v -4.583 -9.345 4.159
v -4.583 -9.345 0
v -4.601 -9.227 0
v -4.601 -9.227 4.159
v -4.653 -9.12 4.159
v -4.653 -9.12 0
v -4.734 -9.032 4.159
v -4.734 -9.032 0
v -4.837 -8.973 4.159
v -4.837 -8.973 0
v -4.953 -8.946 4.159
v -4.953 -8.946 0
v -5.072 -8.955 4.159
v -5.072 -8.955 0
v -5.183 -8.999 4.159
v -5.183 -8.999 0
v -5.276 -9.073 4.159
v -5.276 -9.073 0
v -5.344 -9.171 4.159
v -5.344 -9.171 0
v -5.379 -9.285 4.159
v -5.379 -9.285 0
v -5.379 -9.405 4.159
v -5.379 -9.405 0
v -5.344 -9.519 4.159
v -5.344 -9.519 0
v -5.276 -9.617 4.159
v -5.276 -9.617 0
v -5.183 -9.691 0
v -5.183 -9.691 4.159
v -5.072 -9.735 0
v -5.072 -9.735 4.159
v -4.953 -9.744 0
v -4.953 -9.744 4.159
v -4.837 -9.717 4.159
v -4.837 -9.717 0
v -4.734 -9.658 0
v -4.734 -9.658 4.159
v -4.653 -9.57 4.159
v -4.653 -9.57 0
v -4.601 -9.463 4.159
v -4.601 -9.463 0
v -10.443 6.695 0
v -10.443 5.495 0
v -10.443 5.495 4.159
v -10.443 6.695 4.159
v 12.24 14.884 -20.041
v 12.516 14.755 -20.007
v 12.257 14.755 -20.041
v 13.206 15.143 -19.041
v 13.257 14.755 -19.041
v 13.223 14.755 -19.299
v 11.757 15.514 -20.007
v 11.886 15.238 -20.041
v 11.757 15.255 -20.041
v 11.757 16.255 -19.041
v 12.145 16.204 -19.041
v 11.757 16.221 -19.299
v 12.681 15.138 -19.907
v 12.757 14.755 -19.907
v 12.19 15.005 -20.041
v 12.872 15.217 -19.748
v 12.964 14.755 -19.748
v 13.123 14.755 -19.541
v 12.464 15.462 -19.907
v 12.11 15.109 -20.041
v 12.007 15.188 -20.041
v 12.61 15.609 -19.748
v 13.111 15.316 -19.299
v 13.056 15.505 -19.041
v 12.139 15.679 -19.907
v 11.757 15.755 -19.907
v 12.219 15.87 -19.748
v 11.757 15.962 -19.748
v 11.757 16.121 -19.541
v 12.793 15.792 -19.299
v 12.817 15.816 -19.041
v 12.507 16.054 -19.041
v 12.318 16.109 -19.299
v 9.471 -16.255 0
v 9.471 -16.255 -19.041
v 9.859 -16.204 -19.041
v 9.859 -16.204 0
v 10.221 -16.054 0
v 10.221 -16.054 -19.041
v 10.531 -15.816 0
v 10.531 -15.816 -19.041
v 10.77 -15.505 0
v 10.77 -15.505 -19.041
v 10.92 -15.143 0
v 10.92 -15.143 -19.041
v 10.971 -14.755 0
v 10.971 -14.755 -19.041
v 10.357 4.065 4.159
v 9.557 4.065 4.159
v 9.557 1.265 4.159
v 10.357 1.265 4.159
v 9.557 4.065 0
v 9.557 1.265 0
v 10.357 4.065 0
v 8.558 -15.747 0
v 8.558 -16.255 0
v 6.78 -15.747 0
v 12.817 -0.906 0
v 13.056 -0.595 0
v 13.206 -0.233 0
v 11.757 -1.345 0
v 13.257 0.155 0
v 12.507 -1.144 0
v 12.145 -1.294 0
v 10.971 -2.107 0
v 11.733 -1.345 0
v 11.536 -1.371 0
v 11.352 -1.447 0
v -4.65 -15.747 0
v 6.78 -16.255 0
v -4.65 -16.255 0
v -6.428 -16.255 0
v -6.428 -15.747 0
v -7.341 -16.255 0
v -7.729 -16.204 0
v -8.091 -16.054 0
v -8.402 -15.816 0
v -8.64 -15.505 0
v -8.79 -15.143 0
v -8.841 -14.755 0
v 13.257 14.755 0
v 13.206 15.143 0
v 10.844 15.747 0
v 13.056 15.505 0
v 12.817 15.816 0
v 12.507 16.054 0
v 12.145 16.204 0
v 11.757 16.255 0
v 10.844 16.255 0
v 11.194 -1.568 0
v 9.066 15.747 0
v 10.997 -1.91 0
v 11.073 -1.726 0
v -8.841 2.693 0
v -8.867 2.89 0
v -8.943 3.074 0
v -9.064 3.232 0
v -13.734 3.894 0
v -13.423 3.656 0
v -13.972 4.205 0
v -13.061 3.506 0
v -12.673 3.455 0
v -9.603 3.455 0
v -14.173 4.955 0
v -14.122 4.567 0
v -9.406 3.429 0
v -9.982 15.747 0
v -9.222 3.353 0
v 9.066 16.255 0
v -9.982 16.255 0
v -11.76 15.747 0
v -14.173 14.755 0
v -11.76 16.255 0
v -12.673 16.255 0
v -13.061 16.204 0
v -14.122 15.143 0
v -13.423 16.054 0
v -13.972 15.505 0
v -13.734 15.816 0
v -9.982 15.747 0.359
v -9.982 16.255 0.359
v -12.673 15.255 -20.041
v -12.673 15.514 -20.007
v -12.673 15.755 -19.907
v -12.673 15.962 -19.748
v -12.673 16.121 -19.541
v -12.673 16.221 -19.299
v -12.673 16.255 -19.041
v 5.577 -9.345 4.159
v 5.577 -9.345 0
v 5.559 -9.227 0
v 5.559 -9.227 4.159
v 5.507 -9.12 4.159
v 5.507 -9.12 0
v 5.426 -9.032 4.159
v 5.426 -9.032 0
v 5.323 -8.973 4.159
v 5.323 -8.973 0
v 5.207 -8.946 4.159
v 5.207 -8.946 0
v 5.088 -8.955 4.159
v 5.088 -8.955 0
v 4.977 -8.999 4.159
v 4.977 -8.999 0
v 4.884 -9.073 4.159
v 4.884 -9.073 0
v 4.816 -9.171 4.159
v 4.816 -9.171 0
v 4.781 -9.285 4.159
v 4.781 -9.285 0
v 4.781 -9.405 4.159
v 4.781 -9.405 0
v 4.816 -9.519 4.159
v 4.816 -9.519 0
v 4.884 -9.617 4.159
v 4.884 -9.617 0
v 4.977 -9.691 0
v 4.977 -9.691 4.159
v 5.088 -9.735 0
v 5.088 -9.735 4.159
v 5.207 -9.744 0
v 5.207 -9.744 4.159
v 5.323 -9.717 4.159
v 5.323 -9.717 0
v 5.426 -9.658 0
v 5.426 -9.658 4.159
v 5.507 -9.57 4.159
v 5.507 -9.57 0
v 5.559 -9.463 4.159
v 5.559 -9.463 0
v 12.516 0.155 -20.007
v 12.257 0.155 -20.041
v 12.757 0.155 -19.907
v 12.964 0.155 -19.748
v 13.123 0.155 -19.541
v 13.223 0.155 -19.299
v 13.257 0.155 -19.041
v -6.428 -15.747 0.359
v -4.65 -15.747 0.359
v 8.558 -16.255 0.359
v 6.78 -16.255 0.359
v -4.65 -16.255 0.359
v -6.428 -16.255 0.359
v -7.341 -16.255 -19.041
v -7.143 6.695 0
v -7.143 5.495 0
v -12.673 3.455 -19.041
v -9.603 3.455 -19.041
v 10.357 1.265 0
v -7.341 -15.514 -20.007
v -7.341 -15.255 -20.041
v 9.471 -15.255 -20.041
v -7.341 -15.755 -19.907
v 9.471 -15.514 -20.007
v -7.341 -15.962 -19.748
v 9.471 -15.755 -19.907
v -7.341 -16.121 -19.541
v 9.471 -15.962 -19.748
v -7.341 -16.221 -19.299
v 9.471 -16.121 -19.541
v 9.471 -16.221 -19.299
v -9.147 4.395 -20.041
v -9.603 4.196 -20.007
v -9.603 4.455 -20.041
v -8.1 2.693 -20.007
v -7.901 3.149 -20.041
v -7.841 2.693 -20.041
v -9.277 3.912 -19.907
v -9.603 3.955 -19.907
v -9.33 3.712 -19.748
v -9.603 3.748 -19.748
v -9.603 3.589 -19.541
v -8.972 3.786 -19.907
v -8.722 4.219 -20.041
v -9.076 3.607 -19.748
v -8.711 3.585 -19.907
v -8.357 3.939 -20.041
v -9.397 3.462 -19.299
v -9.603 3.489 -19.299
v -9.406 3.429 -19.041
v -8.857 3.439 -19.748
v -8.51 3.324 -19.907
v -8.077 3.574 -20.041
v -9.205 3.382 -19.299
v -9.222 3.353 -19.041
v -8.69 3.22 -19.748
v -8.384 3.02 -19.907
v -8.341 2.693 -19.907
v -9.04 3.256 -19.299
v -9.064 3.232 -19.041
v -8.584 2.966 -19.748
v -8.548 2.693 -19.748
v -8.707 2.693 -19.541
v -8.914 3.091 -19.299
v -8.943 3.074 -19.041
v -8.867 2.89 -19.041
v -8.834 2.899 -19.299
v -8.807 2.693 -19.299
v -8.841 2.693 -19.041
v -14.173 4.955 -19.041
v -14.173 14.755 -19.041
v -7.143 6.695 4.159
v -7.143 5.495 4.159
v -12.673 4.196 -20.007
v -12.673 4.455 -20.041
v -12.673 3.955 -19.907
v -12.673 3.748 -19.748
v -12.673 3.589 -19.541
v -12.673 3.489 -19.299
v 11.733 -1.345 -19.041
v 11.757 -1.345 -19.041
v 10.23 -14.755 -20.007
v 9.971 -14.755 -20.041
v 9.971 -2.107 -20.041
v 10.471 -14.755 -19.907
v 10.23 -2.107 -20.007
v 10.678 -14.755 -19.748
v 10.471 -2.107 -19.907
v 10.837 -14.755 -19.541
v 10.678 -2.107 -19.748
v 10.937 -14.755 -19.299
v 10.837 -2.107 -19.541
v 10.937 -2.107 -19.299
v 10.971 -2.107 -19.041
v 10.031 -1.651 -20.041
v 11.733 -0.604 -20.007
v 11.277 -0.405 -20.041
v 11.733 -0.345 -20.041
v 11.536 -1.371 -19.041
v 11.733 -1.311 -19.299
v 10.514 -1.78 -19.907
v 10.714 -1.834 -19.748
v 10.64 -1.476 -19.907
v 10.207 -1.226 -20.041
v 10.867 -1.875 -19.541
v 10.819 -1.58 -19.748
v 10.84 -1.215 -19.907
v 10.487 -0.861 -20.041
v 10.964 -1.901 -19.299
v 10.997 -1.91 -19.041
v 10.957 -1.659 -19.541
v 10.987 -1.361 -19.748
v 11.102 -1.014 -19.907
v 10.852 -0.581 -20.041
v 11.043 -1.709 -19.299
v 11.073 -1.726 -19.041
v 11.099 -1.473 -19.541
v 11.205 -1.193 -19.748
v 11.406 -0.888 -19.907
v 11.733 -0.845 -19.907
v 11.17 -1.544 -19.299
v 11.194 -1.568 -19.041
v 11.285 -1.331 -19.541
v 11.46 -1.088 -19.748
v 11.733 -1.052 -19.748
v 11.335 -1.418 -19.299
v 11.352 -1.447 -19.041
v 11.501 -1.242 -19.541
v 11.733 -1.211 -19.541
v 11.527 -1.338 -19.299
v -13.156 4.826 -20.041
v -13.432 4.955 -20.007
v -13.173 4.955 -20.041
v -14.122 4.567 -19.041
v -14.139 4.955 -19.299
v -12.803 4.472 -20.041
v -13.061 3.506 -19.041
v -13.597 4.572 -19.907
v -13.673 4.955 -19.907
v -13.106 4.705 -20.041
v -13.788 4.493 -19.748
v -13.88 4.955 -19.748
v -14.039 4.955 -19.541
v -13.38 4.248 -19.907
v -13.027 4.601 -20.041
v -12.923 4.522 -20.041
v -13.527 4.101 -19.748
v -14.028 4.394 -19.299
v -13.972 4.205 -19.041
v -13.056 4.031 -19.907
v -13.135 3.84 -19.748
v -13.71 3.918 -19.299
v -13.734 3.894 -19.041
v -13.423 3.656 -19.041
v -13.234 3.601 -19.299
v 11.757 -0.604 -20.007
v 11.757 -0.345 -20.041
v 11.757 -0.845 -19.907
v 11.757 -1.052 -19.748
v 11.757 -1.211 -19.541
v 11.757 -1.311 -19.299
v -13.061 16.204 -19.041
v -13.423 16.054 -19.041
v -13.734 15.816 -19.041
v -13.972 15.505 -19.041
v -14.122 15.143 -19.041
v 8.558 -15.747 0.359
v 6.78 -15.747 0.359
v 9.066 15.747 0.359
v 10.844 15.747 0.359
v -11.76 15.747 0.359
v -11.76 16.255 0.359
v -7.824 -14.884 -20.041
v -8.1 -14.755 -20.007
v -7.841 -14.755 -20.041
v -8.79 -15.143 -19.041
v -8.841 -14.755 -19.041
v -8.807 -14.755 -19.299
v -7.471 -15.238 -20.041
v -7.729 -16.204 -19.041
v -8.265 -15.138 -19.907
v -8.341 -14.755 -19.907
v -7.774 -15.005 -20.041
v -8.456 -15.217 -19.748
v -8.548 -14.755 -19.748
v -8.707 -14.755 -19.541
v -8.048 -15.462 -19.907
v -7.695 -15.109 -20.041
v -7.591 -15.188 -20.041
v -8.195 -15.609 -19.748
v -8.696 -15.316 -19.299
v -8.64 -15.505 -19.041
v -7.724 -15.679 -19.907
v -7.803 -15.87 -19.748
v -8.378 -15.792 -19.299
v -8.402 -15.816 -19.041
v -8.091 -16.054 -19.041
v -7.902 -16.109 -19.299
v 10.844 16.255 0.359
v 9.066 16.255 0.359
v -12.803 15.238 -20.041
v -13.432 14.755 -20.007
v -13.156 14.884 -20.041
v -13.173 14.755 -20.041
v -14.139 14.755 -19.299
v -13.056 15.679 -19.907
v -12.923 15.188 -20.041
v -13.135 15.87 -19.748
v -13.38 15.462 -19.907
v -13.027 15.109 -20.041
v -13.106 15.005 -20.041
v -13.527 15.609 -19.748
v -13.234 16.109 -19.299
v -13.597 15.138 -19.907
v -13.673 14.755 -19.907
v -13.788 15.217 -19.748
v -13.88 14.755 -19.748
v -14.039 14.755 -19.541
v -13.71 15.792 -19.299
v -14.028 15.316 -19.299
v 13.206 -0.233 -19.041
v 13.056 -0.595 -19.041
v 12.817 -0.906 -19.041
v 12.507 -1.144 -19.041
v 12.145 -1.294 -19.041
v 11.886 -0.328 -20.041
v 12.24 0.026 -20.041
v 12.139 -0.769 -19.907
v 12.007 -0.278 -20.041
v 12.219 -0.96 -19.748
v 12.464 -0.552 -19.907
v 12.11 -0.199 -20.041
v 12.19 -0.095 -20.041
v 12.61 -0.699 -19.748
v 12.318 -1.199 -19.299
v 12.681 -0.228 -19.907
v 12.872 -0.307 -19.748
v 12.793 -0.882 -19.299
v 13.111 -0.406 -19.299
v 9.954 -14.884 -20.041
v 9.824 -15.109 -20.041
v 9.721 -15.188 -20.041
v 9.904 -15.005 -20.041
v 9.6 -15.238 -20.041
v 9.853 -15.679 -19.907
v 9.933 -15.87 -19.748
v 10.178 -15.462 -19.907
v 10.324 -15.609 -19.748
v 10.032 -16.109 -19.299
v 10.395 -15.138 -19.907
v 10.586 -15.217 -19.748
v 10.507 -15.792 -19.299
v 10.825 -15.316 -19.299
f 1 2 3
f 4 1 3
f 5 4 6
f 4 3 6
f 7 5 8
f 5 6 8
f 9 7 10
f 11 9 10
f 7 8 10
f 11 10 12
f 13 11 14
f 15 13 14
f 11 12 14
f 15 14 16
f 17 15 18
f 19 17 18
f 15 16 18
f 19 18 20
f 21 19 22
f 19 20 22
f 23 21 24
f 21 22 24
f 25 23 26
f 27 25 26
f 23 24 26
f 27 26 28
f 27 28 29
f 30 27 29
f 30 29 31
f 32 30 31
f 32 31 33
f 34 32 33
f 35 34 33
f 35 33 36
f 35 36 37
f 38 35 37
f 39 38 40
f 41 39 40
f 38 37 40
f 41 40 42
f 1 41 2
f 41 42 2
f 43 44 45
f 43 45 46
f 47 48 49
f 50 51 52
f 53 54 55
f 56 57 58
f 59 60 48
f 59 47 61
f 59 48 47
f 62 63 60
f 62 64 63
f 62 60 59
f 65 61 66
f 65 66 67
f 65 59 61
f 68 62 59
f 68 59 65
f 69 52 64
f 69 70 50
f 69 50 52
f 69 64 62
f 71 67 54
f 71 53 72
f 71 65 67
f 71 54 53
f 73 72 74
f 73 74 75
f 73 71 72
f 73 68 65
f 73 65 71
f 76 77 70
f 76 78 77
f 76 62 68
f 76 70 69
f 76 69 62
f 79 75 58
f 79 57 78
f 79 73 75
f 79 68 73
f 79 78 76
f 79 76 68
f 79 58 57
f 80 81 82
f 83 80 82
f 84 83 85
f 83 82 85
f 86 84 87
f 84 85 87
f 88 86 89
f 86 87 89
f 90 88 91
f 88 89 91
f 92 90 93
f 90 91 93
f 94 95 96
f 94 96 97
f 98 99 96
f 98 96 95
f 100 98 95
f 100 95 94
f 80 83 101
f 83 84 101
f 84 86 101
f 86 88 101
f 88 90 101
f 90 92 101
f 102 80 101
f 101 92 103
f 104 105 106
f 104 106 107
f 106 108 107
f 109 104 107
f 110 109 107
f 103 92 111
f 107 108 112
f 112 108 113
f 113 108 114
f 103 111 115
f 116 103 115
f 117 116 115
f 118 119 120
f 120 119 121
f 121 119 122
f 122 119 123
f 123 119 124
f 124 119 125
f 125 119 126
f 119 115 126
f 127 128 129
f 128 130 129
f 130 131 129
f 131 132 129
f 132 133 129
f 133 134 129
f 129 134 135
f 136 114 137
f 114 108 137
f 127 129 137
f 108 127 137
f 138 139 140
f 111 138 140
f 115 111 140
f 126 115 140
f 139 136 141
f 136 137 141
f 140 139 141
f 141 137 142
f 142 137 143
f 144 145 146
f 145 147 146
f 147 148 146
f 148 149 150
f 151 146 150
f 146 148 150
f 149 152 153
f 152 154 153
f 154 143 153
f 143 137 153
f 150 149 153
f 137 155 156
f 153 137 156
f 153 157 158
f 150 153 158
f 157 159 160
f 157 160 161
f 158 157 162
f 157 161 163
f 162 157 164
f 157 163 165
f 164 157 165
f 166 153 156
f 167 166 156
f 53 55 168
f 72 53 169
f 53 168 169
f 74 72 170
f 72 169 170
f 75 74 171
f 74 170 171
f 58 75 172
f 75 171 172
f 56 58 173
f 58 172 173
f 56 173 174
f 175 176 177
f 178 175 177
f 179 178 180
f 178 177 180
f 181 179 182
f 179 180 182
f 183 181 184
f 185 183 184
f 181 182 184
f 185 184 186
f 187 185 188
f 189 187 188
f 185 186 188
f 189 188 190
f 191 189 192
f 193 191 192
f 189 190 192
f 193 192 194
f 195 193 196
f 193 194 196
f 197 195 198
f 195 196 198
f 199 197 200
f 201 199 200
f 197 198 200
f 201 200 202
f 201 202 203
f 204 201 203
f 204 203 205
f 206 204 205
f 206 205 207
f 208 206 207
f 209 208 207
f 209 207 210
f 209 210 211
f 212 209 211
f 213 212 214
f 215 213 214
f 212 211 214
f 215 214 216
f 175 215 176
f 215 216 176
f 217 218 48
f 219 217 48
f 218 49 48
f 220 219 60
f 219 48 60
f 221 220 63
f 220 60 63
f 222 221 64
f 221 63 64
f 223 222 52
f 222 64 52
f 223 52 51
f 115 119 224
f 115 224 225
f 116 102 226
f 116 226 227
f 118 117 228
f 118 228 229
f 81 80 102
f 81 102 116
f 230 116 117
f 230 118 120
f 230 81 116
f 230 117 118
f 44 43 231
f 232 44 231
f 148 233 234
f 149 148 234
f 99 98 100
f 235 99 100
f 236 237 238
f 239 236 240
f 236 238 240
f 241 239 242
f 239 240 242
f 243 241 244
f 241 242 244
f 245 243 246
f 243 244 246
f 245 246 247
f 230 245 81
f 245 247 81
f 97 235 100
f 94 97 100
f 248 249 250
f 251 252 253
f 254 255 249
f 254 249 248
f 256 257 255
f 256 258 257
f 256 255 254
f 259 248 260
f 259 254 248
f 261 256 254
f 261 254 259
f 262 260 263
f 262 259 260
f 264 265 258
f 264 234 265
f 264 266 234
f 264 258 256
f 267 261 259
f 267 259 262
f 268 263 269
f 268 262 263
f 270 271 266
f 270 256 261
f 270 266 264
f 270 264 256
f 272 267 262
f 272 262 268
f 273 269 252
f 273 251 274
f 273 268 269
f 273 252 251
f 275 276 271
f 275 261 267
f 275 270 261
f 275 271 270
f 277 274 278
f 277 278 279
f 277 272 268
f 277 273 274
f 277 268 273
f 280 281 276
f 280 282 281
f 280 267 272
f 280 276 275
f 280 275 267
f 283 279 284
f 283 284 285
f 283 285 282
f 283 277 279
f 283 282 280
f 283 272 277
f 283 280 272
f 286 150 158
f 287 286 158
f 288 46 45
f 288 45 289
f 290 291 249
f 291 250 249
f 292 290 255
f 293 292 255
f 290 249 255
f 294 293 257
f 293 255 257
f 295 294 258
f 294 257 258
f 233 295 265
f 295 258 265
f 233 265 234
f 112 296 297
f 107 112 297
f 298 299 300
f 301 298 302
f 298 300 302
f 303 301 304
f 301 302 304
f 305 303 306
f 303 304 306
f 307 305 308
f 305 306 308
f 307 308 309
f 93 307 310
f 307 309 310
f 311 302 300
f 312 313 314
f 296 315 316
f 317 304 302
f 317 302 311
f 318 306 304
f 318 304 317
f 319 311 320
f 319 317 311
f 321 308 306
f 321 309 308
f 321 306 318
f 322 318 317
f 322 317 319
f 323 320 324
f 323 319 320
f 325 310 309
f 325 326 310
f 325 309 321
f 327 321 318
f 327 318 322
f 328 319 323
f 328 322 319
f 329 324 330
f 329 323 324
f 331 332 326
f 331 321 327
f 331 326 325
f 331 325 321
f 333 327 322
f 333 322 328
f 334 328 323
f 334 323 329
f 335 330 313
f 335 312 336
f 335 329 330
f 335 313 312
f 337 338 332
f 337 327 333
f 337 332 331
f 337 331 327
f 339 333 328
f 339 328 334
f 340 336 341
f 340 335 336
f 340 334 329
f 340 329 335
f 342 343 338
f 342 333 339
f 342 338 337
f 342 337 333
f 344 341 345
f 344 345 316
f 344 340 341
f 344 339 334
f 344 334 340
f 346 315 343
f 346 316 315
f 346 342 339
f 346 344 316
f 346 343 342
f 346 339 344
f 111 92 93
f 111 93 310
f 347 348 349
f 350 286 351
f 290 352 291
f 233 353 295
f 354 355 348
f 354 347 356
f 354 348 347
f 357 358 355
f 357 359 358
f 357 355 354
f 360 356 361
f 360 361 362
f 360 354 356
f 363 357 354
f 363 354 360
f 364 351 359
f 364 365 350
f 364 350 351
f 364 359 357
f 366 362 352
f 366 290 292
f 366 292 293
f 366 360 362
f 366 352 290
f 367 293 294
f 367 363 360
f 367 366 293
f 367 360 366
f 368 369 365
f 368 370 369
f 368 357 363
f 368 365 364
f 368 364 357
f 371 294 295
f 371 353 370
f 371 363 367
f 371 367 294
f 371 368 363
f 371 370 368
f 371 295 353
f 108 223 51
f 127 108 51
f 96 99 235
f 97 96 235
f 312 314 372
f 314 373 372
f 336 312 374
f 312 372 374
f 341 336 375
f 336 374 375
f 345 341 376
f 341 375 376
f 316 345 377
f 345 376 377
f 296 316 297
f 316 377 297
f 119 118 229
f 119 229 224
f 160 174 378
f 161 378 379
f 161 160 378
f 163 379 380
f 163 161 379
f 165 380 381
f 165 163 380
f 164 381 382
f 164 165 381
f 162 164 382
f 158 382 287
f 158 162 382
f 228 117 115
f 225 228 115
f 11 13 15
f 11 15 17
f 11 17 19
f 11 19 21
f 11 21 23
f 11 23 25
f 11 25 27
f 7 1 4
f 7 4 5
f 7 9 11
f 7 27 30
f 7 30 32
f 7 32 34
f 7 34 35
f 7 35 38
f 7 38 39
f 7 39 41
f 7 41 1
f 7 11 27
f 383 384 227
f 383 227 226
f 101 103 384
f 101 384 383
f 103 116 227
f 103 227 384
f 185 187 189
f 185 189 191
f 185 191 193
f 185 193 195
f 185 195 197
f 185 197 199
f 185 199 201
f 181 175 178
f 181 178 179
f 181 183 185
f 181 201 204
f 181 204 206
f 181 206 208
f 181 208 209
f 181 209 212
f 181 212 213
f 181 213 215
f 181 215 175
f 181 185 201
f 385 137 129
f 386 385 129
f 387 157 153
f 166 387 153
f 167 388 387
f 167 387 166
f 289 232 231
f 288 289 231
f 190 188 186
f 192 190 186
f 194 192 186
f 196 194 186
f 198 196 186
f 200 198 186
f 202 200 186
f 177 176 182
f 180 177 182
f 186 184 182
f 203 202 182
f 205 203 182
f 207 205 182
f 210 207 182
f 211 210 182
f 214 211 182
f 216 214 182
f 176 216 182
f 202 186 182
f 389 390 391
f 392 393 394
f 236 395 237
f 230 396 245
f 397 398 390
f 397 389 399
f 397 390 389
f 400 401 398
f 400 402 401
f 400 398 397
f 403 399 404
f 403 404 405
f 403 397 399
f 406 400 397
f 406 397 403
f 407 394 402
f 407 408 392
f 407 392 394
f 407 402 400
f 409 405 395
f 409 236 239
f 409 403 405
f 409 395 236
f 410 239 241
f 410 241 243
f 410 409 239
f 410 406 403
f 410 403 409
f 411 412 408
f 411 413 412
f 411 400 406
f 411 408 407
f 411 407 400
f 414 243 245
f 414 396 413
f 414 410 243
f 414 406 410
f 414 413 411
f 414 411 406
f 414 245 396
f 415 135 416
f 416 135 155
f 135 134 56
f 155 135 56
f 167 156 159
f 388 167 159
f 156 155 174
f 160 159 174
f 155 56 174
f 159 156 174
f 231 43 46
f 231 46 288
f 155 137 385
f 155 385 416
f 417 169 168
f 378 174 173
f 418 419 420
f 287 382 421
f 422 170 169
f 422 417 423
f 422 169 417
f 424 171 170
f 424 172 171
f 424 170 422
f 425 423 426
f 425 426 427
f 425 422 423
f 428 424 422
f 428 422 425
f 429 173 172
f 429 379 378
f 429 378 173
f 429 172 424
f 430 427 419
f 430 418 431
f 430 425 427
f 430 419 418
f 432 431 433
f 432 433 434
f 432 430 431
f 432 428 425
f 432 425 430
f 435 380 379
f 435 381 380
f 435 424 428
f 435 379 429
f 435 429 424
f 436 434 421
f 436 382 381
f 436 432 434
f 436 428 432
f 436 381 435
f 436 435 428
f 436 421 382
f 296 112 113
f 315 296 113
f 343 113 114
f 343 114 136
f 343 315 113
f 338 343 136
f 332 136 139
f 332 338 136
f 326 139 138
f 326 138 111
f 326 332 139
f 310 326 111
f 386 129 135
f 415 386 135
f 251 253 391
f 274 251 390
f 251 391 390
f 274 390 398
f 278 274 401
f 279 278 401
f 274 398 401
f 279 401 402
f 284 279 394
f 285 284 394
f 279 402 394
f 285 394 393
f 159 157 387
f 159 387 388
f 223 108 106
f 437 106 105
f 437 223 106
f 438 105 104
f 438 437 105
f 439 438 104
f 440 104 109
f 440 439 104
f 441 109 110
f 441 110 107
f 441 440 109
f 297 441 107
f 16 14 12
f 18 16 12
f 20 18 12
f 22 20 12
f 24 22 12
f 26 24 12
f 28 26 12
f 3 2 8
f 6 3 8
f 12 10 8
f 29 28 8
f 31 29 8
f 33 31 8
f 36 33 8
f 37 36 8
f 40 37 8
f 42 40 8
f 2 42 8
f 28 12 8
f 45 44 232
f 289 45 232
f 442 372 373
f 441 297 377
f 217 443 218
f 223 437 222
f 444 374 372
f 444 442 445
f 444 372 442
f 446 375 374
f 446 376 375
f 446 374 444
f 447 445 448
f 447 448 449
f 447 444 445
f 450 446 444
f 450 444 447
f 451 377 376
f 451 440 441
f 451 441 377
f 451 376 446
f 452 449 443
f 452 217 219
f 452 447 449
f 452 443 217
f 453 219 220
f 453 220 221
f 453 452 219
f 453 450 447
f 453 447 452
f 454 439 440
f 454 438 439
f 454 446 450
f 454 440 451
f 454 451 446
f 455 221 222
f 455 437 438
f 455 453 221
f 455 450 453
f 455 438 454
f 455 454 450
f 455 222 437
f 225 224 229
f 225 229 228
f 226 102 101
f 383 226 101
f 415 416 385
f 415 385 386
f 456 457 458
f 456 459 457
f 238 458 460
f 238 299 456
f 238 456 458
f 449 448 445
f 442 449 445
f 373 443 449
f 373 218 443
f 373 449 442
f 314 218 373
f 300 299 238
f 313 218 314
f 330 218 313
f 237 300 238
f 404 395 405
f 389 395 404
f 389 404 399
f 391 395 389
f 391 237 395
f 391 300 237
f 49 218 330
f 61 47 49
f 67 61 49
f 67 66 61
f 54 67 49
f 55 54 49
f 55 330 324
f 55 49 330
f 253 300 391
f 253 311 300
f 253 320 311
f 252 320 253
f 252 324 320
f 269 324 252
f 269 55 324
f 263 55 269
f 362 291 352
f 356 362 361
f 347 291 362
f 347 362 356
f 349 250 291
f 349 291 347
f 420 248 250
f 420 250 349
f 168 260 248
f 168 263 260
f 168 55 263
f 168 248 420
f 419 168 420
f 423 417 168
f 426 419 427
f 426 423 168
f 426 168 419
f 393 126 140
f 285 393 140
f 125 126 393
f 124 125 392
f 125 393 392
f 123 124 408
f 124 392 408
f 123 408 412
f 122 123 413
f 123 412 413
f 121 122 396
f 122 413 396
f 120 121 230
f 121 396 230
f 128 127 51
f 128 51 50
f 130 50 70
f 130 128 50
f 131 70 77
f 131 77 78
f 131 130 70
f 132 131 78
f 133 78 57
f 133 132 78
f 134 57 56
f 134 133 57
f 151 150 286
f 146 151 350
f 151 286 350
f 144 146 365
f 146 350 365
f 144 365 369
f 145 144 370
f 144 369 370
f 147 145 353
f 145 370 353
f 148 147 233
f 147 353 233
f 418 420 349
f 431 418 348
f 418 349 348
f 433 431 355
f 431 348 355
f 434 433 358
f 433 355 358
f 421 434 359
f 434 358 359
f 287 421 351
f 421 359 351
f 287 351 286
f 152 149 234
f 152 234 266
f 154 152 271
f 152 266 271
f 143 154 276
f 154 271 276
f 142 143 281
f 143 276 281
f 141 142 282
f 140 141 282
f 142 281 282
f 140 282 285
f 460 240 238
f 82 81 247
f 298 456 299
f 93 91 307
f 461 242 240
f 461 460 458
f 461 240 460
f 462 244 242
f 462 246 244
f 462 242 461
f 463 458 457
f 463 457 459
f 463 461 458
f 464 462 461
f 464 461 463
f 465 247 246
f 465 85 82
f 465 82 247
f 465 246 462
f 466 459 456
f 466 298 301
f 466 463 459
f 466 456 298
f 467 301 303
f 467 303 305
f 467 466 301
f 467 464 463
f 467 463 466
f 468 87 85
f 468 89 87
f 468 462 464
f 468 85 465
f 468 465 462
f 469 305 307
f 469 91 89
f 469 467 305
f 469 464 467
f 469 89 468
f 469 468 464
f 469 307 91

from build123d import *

# Parameters (mm, degrees)
SKETCH1_W           = 27.43
SKETCH1_H           = 32.51
BOSS_EXTRUDE1_DEPTH = 20.0406
SKETCH2_W           = 5.332
SKETCH2_H           = 19.71
CUT_EXTRUDE1_DEPTH  = 21.0406
SKETCH3_W           = 2.286
SKETCH3_H           = 14.91
CUT_EXTRUDE2_DEPTH  = 21.0406
SKETCH4_W           = 3.3
SKETCH4_H           = 1.2
BOSS_EXTRUDE2_DEPTH = 4.1594
SKETCH5_W           = 0.8
SKETCH5_H           = 2.8
BOSS_EXTRUDE3_DEPTH = 4.1594
SKETCH6_R           = 0.4
BOSS_EXTRUDE4_DEPTH = 4.1594
SKETCH7_W           = 1.778
SKETCH7_H           = 0.508
BOSS_EXTRUDE5_DEPTH = 0.3594
SKETCH8_W           = 1.778
SKETCH8_H           = 0.508
BOSS_EXTRUDE6_DEPTH = 0.3594
SKETCH9_W           = 1.778
SKETCH9_H           = 0.508
BOSS_EXTRUDE7_DEPTH = 0.3594
SKETCH10_W          = 1.778
SKETCH10_H          = 0.508
BOSS_EXTRUDE8_DEPTH = 0.3594
SKETCH11_R          = 0.4
BOSS_EXTRUDE9_DEPTH = 4.1594
FILLET1_R           = 1.500124
FILLET2_R           = 0.762
FILLET3_R           = 0.999998


with BuildPart() as part:
    # Sketch1 → Boss-Extrude1 (new body)
    with BuildSketch(Plane(origin=(0, 0, -20.0406), x_dir=(-1, 0, 0), z_dir=(0, 0, -1))):
        with Locations((0.4582, 0)):
            Rectangle(SKETCH1_W, SKETCH1_H)
    extrude(amount=-BOSS_EXTRUDE1_DEPTH)

    # Sketch2 → Cut-Extrude1 (cut, through all)
    with BuildSketch(Plane.XY):
        with Locations((-11.5072, -6.4)):
            Rectangle(SKETCH2_W, SKETCH2_H)
    extrude(amount=-CUT_EXTRUDE1_DEPTH, mode=Mode.SUBTRACT)

    # Sketch3 → Cut-Extrude2 (cut, through all)
    with BuildSketch(Plane.XY):
        with Locations((12.1138, -8.8)):
            Rectangle(SKETCH3_W, SKETCH3_H)
    extrude(amount=-CUT_EXTRUDE2_DEPTH, mode=Mode.SUBTRACT)

    # Sketch7 → Boss-Extrude5 (add)
    with BuildSketch(Plane.XY):
        with Locations((9.9548, 16.001)):
            Rectangle(SKETCH7_W, SKETCH7_H)
    extrude(amount=BOSS_EXTRUDE5_DEPTH)

    # Sketch8 → Boss-Extrude6 (add)
    with BuildSketch(Plane.XY):
        with Locations((-10.8712, 16.001)):
            Rectangle(SKETCH8_W, SKETCH8_H)
    extrude(amount=BOSS_EXTRUDE6_DEPTH)

    # Sketch9 → Boss-Extrude7 (add)
    with BuildSketch(Plane.XY):
        with Locations((-5.5392, -16.001)):
            Rectangle(SKETCH9_W, SKETCH9_H)
    extrude(amount=BOSS_EXTRUDE7_DEPTH)

    # Sketch10 → Boss-Extrude8 (add)
    with BuildSketch(Plane.XY):
        with Locations((7.6688, -16.001)):
            Rectangle(SKETCH10_W, SKETCH10_H)
    extrude(amount=BOSS_EXTRUDE8_DEPTH)

    # Fillet1
    fillet1_edges = [part.edges().sort_by_distance(p)[0] for p in [
        (-8.8412, -16.255, -10.0203),
        (-14.1732, 3.455, -10.0203),
        (13.2568, -1.345, -10.0203),
        (10.9708, -16.255, -10.0203),
        (-14.1732, 16.255, -10.0203),
        (13.2568, 16.255, -10.0203),
    ]]
    fillet(fillet1_edges, radius=FILLET1_R)

    # Fillet2
    fillet2_edges = [part.edges().sort_by_distance(p)[0] for p in [
        (-8.8412, 3.455, -10.0203),
        (10.9708, -1.345, -10.0203),
    ]]
    fillet(fillet2_edges, radius=FILLET2_R)

    # Fillet3
    fillet3_edges = [part.edges().sort_by_distance(p)[0] for p in [
        (-8.8412, -6.030938, -20.0406),
        (-14.1732, 9.855, -20.0406),
        (-0.4582, 16.255, -20.0406),
        (13.2568, 7.455, -20.0406),
        (11.744738, -1.345, -20.0406),
        (-13.733823853, 3.894376147, -20.0406),
        (-8.401823853, -15.815623853, -20.0406),
        (-13.733823853, 15.815623853, -20.0406),
        (12.817423853, -0.905623853, -20.0406),
        (12.817423853, 15.815623853, -20.0406),
        (10.531423853, -15.815623853, -20.0406),
        (10.9708, -8.430938, -20.0406),
        (-11.138138, 3.455, -20.0406),
        (11.193984633, -1.568184633, -20.0406),
        (-9.064384633, 3.231815367, -20.0406),
        (1.0648, -16.255, -20.0406),
    ]]
    fillet(fillet3_edges, radius=FILLET3_R)


with BuildPart() as body_2:
    # Sketch4 → Boss-Extrude2 (new body)
    with BuildSketch(Plane.XY):
        with Locations((-8.7932, 6.095)):
            Rectangle(SKETCH4_W, SKETCH4_H)
    extrude(amount=BOSS_EXTRUDE2_DEPTH)


with BuildPart() as body_3:
    # Sketch5 → Boss-Extrude3 (new body)
    with BuildSketch(Plane.XY):
        with Locations((9.9568, 2.665)):
            Rectangle(SKETCH5_W, SKETCH5_H)
    extrude(amount=BOSS_EXTRUDE3_DEPTH)


with BuildPart() as body_4:
    # Sketch6 → Boss-Extrude4 (new body)
    with BuildSketch(Plane.XY):
        with Locations((-4.9832, -9.345)):
            Circle(SKETCH6_R)
    extrude(amount=BOSS_EXTRUDE4_DEPTH)


with BuildPart() as body_5:
    # Sketch11 → Boss-Extrude9 (new body)
    with BuildSketch(Plane.XY):
        with Locations((5.1768, -9.345)):
            Circle(SKETCH11_R)
    extrude(amount=BOSS_EXTRUDE9_DEPTH)


solid = Compound([part.part, body_2.part, body_3.part, body_4.part, body_5.part])
